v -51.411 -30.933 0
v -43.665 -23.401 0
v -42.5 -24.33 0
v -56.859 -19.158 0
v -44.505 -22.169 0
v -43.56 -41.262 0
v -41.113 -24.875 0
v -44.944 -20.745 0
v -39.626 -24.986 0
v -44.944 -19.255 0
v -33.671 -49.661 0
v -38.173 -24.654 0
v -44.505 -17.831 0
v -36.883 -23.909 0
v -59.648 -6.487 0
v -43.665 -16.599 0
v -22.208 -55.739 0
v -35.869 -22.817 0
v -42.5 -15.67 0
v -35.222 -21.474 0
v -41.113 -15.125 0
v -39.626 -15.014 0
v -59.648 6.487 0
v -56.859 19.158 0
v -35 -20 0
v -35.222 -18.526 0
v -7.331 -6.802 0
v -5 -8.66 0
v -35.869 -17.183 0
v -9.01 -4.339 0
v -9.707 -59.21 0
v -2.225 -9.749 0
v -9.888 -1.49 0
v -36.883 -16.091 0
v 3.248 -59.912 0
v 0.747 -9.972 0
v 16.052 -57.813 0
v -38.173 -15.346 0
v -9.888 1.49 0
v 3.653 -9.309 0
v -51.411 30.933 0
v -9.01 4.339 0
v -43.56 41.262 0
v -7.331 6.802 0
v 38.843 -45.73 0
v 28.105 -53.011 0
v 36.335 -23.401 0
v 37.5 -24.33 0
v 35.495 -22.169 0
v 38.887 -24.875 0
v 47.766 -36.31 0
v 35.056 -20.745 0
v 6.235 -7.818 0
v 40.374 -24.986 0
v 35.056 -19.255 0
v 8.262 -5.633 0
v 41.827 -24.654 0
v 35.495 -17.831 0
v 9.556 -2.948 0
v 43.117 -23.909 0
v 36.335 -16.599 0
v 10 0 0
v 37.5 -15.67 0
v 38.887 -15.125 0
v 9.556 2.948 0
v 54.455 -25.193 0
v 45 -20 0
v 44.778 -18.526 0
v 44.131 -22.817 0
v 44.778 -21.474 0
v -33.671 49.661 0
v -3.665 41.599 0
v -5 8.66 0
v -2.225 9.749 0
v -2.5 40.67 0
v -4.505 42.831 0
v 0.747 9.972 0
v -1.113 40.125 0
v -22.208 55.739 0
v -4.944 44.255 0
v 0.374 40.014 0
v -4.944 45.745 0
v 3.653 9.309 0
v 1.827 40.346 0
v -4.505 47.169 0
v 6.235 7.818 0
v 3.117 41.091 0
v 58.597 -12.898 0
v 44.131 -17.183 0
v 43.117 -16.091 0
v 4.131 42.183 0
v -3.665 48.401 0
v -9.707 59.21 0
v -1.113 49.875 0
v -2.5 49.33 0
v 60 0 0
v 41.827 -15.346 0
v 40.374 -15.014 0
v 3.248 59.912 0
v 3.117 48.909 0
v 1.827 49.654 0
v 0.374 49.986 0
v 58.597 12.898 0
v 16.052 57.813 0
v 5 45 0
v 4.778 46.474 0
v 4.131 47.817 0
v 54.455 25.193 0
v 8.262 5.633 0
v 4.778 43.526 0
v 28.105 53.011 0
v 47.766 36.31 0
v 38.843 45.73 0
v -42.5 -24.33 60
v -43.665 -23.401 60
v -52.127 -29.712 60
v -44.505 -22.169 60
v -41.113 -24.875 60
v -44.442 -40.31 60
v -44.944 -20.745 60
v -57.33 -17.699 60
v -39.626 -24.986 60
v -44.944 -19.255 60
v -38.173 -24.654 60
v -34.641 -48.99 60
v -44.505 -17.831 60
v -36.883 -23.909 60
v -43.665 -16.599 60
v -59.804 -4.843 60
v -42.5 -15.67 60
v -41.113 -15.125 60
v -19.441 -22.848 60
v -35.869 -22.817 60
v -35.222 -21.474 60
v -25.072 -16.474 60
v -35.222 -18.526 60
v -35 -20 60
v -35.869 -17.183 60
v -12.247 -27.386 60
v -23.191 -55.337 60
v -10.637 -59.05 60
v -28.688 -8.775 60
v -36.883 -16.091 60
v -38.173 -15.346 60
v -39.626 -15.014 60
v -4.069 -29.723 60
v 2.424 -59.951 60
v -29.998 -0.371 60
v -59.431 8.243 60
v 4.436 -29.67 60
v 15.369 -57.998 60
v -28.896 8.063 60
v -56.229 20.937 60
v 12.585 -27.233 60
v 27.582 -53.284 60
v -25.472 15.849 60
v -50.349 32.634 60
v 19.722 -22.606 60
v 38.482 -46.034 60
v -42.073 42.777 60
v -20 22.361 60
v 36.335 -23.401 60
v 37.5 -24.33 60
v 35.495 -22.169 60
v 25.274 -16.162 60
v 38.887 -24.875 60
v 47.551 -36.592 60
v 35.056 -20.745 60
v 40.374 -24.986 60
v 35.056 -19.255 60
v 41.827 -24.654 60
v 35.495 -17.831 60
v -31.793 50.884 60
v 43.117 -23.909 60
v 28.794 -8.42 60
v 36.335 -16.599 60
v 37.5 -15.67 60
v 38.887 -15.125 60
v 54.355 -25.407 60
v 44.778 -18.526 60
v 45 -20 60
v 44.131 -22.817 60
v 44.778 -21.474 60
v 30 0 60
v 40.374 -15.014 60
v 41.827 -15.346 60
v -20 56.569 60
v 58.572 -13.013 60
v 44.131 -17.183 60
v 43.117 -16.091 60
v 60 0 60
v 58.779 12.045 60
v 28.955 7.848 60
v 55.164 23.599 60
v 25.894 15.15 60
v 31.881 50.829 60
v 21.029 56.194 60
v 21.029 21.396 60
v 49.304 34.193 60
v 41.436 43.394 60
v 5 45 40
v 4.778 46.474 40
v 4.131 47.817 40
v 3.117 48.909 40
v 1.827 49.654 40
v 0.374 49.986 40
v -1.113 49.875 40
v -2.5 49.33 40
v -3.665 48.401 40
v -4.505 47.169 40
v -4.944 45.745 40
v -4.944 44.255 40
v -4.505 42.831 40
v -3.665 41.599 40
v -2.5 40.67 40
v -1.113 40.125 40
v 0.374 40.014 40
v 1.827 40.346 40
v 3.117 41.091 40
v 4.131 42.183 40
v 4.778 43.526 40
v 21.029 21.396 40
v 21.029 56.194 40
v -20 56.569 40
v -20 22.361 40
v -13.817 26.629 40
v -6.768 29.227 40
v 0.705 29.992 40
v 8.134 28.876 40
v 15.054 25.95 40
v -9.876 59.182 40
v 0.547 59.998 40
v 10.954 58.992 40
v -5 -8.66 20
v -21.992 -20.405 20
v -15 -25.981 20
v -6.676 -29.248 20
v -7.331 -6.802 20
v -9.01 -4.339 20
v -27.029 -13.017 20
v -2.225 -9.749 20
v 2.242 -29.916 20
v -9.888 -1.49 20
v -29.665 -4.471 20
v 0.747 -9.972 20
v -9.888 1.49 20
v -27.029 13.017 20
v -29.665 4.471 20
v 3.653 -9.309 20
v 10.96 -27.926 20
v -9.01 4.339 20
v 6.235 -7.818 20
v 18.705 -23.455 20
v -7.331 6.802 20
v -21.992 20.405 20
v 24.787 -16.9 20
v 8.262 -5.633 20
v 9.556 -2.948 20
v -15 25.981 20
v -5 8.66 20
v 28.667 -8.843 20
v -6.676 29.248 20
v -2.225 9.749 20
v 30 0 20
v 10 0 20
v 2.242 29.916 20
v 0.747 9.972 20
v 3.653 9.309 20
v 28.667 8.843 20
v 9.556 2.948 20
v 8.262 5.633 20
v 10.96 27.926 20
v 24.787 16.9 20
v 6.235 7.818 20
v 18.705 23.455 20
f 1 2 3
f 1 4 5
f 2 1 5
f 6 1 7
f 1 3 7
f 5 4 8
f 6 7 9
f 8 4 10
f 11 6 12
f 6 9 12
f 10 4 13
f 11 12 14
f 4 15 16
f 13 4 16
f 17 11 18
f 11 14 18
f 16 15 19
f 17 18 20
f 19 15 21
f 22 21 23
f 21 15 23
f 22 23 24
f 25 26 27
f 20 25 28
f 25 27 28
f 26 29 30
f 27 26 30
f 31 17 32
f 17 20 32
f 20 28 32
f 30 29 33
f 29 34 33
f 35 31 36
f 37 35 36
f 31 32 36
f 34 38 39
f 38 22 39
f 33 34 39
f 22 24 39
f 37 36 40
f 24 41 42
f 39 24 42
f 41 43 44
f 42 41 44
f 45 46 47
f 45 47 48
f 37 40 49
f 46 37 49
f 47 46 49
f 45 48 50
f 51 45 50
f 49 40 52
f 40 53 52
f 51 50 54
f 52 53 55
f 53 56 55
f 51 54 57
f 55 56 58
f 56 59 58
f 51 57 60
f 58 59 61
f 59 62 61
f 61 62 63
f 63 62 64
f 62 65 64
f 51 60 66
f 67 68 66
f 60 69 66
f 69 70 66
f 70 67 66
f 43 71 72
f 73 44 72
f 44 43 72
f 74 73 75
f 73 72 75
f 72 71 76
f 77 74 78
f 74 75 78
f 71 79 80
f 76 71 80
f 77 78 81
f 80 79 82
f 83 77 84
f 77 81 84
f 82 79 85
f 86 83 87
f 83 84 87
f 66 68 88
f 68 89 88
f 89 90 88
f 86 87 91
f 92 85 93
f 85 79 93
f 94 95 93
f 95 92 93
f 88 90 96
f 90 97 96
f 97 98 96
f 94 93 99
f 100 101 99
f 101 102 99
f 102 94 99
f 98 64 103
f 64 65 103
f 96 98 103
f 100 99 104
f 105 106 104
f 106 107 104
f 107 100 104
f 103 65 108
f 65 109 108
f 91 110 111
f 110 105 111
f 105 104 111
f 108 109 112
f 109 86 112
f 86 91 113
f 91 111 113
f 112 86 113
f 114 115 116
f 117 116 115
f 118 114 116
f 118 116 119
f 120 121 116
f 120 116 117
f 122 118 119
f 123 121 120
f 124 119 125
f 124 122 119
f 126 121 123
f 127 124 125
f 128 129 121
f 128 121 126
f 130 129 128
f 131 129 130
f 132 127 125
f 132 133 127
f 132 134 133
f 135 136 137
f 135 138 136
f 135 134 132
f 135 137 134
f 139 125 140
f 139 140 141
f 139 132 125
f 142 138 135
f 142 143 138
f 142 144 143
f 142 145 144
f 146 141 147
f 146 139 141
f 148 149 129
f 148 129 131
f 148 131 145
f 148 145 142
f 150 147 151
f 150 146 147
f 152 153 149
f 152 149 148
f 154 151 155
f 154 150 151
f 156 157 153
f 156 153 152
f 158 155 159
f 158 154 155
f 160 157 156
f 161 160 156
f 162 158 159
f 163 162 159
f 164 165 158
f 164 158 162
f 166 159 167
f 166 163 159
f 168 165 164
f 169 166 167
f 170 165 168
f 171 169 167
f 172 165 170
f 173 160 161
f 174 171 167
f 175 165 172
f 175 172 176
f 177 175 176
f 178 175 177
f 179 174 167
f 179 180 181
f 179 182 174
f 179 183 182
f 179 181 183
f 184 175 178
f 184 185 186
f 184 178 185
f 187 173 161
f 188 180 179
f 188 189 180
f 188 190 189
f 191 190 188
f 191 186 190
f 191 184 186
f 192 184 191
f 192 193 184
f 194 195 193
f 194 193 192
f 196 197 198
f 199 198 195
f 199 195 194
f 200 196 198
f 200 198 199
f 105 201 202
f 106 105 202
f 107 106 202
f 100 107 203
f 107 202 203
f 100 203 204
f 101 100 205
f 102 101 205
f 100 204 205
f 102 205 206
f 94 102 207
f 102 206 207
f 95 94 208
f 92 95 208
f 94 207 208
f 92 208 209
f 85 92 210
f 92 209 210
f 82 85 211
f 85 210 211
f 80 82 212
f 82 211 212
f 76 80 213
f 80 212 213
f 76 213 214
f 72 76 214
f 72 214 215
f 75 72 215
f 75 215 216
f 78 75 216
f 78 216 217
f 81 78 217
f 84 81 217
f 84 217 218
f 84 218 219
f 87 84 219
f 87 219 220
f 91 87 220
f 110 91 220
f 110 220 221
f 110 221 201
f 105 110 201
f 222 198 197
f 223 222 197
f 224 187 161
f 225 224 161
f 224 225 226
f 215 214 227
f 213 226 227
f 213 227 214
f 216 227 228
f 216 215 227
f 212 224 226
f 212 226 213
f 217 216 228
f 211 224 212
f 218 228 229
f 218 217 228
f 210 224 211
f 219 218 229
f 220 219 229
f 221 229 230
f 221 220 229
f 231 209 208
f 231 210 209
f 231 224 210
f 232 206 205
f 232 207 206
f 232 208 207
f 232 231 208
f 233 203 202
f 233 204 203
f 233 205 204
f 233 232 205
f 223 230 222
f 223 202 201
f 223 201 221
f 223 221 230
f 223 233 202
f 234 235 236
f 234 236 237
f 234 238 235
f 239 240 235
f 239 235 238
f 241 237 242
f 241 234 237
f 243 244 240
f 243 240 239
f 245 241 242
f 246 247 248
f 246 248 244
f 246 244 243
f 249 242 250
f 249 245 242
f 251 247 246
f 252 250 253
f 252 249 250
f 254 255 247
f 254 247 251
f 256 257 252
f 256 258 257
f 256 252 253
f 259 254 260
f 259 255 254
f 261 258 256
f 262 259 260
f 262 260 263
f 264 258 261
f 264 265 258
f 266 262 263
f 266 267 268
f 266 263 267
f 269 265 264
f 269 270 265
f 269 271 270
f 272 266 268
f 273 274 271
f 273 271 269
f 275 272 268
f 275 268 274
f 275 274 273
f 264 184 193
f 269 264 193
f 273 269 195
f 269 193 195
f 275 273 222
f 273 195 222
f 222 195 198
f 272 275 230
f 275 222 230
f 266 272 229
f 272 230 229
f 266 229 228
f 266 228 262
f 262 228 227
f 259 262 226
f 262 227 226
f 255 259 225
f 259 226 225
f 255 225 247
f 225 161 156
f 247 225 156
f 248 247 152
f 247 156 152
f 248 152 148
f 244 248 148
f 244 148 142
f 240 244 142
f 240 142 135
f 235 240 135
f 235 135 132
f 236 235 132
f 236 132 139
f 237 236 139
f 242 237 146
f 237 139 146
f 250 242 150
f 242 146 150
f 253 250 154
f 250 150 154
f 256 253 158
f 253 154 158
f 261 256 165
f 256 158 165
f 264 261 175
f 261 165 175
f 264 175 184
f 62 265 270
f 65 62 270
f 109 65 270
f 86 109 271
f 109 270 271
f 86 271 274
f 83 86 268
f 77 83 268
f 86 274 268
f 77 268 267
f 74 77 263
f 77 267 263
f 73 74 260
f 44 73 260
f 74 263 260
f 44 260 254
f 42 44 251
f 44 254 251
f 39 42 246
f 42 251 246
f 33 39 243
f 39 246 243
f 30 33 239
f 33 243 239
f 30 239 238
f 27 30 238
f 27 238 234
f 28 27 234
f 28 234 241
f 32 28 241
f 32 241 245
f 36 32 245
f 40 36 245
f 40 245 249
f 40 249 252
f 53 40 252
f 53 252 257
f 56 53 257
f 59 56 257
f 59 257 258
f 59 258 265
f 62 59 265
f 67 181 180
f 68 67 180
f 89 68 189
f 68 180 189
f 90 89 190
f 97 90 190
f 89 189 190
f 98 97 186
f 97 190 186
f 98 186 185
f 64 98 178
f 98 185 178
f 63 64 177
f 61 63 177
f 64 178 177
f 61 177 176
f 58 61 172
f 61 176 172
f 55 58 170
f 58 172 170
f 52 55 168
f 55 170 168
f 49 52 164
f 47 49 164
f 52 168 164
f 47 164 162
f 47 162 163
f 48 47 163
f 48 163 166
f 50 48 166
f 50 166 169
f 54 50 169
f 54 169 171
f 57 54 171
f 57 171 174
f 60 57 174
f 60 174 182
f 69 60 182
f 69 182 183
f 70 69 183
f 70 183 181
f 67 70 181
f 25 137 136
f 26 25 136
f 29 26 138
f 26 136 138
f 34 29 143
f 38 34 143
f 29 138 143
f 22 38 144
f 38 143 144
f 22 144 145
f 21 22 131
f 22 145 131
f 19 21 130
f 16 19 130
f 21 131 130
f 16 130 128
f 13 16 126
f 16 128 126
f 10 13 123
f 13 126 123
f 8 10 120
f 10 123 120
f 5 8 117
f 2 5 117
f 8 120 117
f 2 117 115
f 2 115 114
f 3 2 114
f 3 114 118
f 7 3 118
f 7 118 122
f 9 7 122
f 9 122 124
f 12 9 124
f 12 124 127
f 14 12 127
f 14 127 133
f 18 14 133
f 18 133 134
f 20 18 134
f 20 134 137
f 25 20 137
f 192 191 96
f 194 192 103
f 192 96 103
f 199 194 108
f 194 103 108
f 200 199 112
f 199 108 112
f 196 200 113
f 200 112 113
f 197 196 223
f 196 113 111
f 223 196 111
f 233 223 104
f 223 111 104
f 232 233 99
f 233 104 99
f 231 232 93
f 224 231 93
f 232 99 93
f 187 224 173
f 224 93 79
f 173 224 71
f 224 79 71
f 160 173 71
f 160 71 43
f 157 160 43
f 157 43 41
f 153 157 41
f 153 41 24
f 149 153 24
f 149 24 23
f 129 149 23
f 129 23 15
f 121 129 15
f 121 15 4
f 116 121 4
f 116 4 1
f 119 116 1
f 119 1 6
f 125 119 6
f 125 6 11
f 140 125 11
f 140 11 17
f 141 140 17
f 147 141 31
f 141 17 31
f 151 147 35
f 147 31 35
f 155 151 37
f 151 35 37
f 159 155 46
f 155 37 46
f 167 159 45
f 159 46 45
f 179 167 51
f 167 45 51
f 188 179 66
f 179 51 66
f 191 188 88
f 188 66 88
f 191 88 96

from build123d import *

# Parameters (mm, degrees)
SKETCH1_R           = 60
BOSS_EXTRUDE1_DEPTH = 60
SKETCH2_R           = 30
CUT_EXTRUDE1_DEPTH  = 40
SKETCH3_R           = 10
CUT_EXTRUDE2_DEPTH  = 40
SKETCH4_R           = 5
CUT_EXTRUDE3_DEPTH  = 100
SKETCH5_R           = 5
CUT_EXTRUDE4_DEPTH  = 100
CUT_EXTRUDE5_DEPTH  = 20


with BuildPart() as part:
    # Sketch1 → Boss-Extrude1 (new body)
    with BuildSketch(Plane.XY):
        Circle(SKETCH1_R)
    extrude(amount=BOSS_EXTRUDE1_DEPTH)

    # Sketch2 → Cut-Extrude1 (cut)
    with BuildSketch(Plane.XY.offset(60)):
        Circle(SKETCH2_R)
    extrude(amount=-CUT_EXTRUDE1_DEPTH, mode=Mode.SUBTRACT)

    # Sketch3 → Cut-Extrude2 (cut)
    with BuildSketch(Plane.XY.offset(20)):
        Circle(SKETCH3_R)
    extrude(amount=-CUT_EXTRUDE2_DEPTH, mode=Mode.SUBTRACT)

    # Sketch4 → Cut-Extrude3 (cut)
    with BuildSketch(Plane.XY.offset(60)):
        with Locations((0, 45)):
            Circle(SKETCH4_R)
    extrude(amount=-CUT_EXTRUDE3_DEPTH, mode=Mode.SUBTRACT)

    # Sketch5 → Cut-Extrude4 (cut)
    with BuildSketch(Plane.XY.offset(60)):
        with Locations((-40, -20)):
            Circle(SKETCH5_R)
        with Locations((40, -20)):
            Circle(SKETCH5_R)
    extrude(amount=-CUT_EXTRUDE4_DEPTH, mode=Mode.SUBTRACT)

    # Sketch6 → Cut-Extrude5 (cut)
    with BuildSketch(Plane.XY.offset(60)):
        with BuildLine():
            Line((-20, 56.568542495), (-20, 22.360679775))
            ThreePointArc((-20, 22.360679775), (0.705121947, 29.991712239), (21.02874571, 21.396070991))
            Line((21.02874571, 21.396070991), (21.02874571, 56.194233279))
            ThreePointArc((21.02874571, 56.194233279), (0.547363025, 59.997503229), (-20, 56.568542495))
        make_face()
    extrude(amount=-CUT_EXTRUDE5_DEPTH, mode=Mode.SUBTRACT)


solid = part.part
